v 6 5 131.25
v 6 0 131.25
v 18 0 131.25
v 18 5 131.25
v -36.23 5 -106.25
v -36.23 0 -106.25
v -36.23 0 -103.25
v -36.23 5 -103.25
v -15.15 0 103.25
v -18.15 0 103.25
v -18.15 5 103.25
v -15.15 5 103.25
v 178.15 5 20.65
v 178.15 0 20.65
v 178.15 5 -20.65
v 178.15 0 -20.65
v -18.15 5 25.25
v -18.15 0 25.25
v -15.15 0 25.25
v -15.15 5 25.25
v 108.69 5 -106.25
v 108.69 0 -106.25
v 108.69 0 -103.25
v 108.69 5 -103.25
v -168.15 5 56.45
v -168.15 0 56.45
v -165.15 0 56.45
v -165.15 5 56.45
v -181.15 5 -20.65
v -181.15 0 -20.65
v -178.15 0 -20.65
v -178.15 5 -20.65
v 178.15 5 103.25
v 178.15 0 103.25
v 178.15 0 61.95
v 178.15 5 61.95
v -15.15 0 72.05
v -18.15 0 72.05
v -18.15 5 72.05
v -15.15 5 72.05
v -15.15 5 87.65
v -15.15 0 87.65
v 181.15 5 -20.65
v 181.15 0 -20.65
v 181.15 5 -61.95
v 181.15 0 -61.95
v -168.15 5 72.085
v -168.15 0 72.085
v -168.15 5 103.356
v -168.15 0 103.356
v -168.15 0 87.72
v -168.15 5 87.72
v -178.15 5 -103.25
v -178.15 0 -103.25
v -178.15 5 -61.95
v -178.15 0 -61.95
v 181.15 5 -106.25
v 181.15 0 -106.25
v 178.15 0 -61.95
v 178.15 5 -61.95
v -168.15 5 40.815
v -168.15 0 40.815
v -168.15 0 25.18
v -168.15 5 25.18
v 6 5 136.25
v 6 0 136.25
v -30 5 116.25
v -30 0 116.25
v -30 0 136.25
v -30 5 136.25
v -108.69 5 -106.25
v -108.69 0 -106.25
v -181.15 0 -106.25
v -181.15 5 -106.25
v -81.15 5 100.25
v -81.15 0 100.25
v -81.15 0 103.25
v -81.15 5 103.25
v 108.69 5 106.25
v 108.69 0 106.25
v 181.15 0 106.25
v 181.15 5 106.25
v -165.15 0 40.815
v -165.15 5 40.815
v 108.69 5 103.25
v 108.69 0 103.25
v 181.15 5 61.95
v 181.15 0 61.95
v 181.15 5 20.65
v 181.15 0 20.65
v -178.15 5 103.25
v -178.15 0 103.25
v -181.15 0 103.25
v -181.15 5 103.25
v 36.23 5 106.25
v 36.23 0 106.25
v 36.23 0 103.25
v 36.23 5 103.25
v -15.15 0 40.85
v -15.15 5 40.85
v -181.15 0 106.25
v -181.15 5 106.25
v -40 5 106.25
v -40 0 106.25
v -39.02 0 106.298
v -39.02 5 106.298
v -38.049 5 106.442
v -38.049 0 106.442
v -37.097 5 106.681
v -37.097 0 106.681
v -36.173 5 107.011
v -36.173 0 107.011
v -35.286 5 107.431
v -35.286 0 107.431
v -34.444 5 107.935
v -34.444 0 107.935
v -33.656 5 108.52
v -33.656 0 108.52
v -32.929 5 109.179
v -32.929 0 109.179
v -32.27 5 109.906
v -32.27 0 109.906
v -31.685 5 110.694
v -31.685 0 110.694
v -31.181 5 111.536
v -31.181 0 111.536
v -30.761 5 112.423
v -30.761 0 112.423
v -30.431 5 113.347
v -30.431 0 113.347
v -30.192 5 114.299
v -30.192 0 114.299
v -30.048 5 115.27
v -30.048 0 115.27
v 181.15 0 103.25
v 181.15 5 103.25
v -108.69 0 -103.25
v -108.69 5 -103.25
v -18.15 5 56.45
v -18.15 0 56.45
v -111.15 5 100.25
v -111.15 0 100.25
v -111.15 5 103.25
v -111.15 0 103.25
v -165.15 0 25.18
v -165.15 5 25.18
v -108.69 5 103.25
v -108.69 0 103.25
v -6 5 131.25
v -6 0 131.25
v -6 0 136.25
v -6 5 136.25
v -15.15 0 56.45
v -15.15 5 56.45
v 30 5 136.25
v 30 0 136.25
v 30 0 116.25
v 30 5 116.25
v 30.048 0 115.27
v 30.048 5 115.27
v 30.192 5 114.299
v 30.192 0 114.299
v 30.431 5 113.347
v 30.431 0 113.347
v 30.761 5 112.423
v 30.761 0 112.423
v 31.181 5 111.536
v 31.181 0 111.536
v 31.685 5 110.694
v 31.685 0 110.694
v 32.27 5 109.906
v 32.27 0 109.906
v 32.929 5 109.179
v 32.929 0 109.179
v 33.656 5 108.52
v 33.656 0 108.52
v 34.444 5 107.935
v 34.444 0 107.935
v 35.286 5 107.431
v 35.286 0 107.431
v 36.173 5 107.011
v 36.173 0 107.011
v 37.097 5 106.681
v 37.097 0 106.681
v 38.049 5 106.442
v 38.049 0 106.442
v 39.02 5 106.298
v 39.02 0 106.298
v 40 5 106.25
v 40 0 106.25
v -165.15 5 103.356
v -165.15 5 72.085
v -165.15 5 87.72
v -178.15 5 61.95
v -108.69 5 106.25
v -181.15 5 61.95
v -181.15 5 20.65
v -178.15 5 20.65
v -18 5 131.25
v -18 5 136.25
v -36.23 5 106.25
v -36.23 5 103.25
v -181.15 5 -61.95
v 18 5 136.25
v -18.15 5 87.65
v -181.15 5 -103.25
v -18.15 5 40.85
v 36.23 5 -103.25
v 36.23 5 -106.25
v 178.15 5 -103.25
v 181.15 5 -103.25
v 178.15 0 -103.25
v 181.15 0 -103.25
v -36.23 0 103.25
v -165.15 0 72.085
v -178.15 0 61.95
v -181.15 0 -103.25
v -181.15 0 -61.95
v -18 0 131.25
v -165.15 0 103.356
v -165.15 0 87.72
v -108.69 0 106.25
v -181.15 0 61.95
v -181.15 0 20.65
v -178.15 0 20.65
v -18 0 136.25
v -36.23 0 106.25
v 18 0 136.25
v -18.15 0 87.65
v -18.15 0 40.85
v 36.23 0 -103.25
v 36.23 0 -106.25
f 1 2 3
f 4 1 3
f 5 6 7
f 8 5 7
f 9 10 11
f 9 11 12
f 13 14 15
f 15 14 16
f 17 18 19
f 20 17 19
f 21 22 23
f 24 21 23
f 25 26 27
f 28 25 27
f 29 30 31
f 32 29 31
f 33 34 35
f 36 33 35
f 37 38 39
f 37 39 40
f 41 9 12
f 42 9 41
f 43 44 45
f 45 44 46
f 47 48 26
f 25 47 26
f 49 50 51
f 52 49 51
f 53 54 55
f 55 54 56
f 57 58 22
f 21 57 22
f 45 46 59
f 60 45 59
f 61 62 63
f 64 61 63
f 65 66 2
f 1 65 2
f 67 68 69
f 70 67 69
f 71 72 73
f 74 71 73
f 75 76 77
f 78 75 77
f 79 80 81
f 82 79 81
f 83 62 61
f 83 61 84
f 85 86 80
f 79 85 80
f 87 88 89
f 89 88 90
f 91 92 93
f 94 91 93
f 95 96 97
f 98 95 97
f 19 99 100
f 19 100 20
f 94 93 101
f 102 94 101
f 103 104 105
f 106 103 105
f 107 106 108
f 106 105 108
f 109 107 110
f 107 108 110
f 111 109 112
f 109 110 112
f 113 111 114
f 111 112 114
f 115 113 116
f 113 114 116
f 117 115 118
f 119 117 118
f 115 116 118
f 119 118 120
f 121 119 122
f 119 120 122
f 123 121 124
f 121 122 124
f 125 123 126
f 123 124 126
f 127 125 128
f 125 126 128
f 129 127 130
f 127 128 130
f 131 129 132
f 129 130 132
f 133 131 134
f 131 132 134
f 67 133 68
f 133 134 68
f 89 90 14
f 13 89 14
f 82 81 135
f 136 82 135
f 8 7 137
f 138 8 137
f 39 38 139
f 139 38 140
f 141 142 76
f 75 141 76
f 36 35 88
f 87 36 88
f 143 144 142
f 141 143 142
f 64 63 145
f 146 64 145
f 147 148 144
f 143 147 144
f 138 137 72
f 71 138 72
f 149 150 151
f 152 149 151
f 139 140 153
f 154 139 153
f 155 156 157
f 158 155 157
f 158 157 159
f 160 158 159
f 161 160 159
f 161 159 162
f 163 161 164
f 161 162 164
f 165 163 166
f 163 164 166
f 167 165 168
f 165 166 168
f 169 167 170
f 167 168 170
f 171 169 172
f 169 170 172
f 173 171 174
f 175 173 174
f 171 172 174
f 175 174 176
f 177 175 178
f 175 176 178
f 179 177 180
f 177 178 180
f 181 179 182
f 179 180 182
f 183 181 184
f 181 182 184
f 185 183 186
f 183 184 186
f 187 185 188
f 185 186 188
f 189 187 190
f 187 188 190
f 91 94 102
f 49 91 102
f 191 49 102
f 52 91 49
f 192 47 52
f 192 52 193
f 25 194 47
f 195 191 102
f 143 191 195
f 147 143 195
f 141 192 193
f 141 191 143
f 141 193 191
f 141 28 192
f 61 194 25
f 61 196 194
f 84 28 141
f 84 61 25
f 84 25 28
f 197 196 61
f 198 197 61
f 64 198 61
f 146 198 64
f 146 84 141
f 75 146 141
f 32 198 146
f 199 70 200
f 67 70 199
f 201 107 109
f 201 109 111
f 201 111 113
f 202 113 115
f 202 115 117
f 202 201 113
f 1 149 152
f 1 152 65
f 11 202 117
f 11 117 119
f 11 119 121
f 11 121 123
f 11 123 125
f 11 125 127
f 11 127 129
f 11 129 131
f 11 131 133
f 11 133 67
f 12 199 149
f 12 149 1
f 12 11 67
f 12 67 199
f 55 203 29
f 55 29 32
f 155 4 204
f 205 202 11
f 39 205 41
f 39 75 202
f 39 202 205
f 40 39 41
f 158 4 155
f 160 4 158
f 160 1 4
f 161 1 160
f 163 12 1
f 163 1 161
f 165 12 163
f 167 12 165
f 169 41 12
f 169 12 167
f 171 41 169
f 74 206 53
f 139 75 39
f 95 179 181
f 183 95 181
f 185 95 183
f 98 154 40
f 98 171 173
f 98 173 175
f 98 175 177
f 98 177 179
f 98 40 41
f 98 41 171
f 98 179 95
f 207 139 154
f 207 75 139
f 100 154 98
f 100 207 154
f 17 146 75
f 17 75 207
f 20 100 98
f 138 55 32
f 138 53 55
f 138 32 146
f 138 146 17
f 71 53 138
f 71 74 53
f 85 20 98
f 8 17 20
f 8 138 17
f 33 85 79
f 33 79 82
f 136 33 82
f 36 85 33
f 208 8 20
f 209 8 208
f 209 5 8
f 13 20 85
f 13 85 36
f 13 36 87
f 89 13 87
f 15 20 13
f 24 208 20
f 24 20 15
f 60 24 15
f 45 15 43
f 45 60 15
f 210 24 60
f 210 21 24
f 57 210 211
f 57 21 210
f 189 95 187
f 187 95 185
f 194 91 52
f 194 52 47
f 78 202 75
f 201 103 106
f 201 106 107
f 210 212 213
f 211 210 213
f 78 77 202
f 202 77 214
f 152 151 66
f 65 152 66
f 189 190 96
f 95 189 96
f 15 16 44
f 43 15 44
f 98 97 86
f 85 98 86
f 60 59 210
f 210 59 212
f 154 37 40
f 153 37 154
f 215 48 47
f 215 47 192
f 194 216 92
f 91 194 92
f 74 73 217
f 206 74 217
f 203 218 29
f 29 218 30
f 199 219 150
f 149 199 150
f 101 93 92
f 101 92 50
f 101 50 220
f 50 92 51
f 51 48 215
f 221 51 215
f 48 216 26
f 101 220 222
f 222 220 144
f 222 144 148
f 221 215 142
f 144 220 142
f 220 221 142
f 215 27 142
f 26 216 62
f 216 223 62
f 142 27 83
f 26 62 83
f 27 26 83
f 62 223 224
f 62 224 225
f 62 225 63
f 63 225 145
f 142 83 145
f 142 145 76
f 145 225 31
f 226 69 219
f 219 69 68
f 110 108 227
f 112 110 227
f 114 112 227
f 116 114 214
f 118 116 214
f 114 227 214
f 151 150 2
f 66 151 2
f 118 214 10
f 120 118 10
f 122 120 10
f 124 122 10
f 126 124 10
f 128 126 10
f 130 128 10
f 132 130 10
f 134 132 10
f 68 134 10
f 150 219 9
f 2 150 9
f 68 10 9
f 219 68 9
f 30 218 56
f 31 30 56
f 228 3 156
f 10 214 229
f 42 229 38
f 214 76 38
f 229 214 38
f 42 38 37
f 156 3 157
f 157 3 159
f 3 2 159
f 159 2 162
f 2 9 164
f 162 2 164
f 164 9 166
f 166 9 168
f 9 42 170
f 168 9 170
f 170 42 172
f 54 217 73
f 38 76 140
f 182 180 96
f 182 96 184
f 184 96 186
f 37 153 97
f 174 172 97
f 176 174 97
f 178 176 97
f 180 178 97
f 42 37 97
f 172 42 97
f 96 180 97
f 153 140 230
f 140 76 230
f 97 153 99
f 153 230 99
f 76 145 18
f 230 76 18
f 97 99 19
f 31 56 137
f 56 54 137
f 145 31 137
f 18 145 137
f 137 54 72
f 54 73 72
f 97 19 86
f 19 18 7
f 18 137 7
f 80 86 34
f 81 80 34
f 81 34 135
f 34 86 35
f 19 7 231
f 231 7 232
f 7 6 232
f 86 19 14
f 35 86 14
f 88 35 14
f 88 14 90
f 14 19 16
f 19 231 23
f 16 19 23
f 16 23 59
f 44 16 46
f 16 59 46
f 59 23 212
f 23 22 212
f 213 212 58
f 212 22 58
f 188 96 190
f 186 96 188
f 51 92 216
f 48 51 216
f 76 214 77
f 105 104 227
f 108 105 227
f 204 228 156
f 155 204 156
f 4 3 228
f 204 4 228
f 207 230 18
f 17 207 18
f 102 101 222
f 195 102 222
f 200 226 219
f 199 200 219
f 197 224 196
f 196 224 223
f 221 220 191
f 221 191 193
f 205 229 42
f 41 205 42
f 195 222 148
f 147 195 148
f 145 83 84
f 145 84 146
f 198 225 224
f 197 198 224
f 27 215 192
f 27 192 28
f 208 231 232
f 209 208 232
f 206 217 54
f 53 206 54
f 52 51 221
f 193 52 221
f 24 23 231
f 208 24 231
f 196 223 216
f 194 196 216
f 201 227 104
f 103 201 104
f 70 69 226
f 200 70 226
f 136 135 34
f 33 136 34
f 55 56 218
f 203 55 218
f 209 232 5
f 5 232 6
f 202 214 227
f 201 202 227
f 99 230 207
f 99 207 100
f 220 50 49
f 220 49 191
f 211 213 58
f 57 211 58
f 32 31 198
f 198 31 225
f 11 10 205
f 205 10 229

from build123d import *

# Parameters (mm, degrees)
SKETCH1_W           = 3
SKETCH1_H           = 15.635202888
SKETCH1_H_2         = 15.6
SKETCH1_H_3         = 15.635202889
BOSS_EXTRUDE1_DEPTH = 5


with BuildPart() as part:
    # Sketch1 → Boss-Extrude1 (new body)
    with BuildSketch(Plane(origin=(0, 0, 0), x_dir=(1, 0, 0), z_dir=(0, 1, 0))):
        with BuildLine():
            Line((-30.000015974, -136.250310986), (-18.000015974, -136.250310986))
            Line((-18.000015974, -136.250310986), (-18.000015974, -131.250310986))
            Line((-18.000015974, -131.250310986), (-6.000015974, -131.250310986))
            Line((-6.000015974, -131.250310986), (-6.000015974, -136.250310986))
            Line((-6.000015974, -136.250310986), (5.999984026, -136.250310986))
            Line((5.999984026, -136.250310986), (5.999984026, -131.250310986))
            Line((5.999984026, -131.250310986), (17.999984026, -131.250310986))
            Line((17.999984026, -131.250310986), (17.999984026, -136.250310986))
            Line((17.999984026, -136.250310986), (30.000006721, -136.250310986))
            Line((30.000006721, -136.250310986), (30.000006721, -116.24999063))
            ThreePointArc((30.000006721, -116.24999063), (32.92893891, -109.178922818), (40.000006721, -106.24999063))
            Line((40.000006721, -106.24999063), (36.229984025, -106.24999063))
            Line((36.229984025, -106.24999063), (36.229984025, -103.249670275))
            Line((36.229984025, -103.249670275), (108.689984025, -103.249670275))
            Line((108.689984025, -103.249670275), (108.689984025, -106.24999063))
            Line((108.689984025, -106.24999063), (181.149984025, -106.24999063))
            Line((181.149984025, -106.24999063), (181.149984025, -103.24999063))
            Line((181.149984025, -103.24999063), (178.149984476, -103.24999063))
            Line((178.149984476, -103.24999063), (178.149984476, -61.94999063))
            Line((178.149984476, -61.94999063), (181.149984025, -61.94999063))
            Line((181.149984025, -61.94999063), (181.149984025, -20.64999063))
            Line((181.149984025, -20.64999063), (178.149984927, -20.64999063))
            Line((178.149984927, -20.64999063), (178.149984927, 20.65000937))
            Line((178.149984927, 20.65000937), (181.149984025, 20.65000937))
            Line((181.149984025, 20.65000937), (181.149984025, 61.95000937))
            Line((181.149984025, 61.95000937), (178.149984927, 61.95000937))
            Line((178.149984927, 61.95000937), (178.149984927, 103.25000937))
            Line((178.149984927, 103.25000937), (181.149984025, 103.25000937))
            Line((181.149984025, 103.25000937), (181.150047924, 106.25000937))
            Line((181.150047924, 106.25000937), (108.689984025, 106.25000937))
            Line((108.689984025, 106.25000937), (108.689984025, 103.249689014))
            Line((108.689984025, 103.249689014), (36.229984025, 103.249689014))
            Line((36.229984025, 103.249689014), (36.229984025, 106.25000937))
            Line((36.229984025, 106.25000937), (-36.230015974, 106.25000937))
            Line((-36.230015974, 106.25000937), (-36.230015974, 103.249689014))
            Line((-36.230015974, 103.249689014), (-108.690015974, 103.249689014))
            Line((-108.690015974, 103.249689014), (-108.690015974, 106.25000937))
            Line((-108.690015974, 106.25000937), (-181.150015974, 106.25000937))
            Line((-181.150015974, 106.25000937), (-181.150015974, 103.25000937))
            Line((-181.150015974, 103.25000937), (-178.150016876, 103.25000937))
            Line((-178.150016876, 103.25000937), (-178.150016876, 61.95000937))
            Line((-178.150016876, 61.95000937), (-181.150015974, 61.95000937))
            Line((-181.150015974, 61.95000937), (-181.150015974, 20.65000937))
            Line((-181.150015974, 20.65000937), (-178.150016876, 20.65000937))
            Line((-178.150016876, 20.65000937), (-178.150016876, -20.64999063))
            Line((-178.150016876, -20.64999063), (-181.150015974, -20.64999063))
            Line((-181.150015974, -20.64999063), (-181.150015974, -61.94999063))
            Line((-181.150015974, -61.94999063), (-178.150016425, -61.94999063))
            Line((-178.150016425, -61.94999063), (-178.150016425, -103.24999063))
            Line((-178.150016425, -103.24999063), (-181.150015974, -103.24999063))
            Line((-181.150015974, -103.24999063), (-181.150015974, -106.24999063))
            Line((-181.150015974, -106.24999063), (-108.690015974, -106.24999063))
            Line((-108.690015974, -106.24999063), (-108.690015974, -103.24999063))
            Line((-108.690015974, -103.24999063), (-111.150015974, -103.24999063))
            Line((-111.150015974, -103.24999063), (-111.150015974, -100.24999063))
            Line((-111.150015974, -100.24999063), (-81.150015974, -100.24999063))
            Line((-81.150015974, -100.24999063), (-81.150015974, -103.249670275))
            Line((-81.150015974, -103.249670275), (-36.230015974, -103.249670275))
            Line((-36.230015974, -103.249670275), (-36.230015974, -106.24999063))
            Line((-36.230015974, -106.24999063), (-40.000015974, -106.24999063))
            ThreePointArc((-40.000015974, -106.24999063), (-32.928948162, -109.178922818), (-30.000015974, -116.24999063))
            Line((-30.000015974, -116.24999063), (-30.000015974, -136.250310986))
        make_face()
        with Locations((-166.650000226, -95.537975278)):
            Rectangle(SKETCH1_W, SKETCH1_H, mode=Mode.SUBTRACT)
        with Locations((-16.650016425, -95.449968057)):
            Rectangle(SKETCH1_W, SKETCH1_H_2, mode=Mode.SUBTRACT)
        with Locations((-166.650000226, -32.997163725)):
            Rectangle(SKETCH1_W, SKETCH1_H, mode=Mode.SUBTRACT)
        with Locations((-16.650016425, -33.049968057)):
            Rectangle(SKETCH1_W, SKETCH1_H_2, mode=Mode.SUBTRACT)
        with Locations((-166.650000226, -64.267569502)):
            Rectangle(SKETCH1_W, SKETCH1_H_3, mode=Mode.SUBTRACT)
        with Locations((-16.650016425, -64.249968057)):
            Rectangle(SKETCH1_W, SKETCH1_H_2, mode=Mode.SUBTRACT)
    extrude(amount=BOSS_EXTRUDE1_DEPTH)


solid = part.part
